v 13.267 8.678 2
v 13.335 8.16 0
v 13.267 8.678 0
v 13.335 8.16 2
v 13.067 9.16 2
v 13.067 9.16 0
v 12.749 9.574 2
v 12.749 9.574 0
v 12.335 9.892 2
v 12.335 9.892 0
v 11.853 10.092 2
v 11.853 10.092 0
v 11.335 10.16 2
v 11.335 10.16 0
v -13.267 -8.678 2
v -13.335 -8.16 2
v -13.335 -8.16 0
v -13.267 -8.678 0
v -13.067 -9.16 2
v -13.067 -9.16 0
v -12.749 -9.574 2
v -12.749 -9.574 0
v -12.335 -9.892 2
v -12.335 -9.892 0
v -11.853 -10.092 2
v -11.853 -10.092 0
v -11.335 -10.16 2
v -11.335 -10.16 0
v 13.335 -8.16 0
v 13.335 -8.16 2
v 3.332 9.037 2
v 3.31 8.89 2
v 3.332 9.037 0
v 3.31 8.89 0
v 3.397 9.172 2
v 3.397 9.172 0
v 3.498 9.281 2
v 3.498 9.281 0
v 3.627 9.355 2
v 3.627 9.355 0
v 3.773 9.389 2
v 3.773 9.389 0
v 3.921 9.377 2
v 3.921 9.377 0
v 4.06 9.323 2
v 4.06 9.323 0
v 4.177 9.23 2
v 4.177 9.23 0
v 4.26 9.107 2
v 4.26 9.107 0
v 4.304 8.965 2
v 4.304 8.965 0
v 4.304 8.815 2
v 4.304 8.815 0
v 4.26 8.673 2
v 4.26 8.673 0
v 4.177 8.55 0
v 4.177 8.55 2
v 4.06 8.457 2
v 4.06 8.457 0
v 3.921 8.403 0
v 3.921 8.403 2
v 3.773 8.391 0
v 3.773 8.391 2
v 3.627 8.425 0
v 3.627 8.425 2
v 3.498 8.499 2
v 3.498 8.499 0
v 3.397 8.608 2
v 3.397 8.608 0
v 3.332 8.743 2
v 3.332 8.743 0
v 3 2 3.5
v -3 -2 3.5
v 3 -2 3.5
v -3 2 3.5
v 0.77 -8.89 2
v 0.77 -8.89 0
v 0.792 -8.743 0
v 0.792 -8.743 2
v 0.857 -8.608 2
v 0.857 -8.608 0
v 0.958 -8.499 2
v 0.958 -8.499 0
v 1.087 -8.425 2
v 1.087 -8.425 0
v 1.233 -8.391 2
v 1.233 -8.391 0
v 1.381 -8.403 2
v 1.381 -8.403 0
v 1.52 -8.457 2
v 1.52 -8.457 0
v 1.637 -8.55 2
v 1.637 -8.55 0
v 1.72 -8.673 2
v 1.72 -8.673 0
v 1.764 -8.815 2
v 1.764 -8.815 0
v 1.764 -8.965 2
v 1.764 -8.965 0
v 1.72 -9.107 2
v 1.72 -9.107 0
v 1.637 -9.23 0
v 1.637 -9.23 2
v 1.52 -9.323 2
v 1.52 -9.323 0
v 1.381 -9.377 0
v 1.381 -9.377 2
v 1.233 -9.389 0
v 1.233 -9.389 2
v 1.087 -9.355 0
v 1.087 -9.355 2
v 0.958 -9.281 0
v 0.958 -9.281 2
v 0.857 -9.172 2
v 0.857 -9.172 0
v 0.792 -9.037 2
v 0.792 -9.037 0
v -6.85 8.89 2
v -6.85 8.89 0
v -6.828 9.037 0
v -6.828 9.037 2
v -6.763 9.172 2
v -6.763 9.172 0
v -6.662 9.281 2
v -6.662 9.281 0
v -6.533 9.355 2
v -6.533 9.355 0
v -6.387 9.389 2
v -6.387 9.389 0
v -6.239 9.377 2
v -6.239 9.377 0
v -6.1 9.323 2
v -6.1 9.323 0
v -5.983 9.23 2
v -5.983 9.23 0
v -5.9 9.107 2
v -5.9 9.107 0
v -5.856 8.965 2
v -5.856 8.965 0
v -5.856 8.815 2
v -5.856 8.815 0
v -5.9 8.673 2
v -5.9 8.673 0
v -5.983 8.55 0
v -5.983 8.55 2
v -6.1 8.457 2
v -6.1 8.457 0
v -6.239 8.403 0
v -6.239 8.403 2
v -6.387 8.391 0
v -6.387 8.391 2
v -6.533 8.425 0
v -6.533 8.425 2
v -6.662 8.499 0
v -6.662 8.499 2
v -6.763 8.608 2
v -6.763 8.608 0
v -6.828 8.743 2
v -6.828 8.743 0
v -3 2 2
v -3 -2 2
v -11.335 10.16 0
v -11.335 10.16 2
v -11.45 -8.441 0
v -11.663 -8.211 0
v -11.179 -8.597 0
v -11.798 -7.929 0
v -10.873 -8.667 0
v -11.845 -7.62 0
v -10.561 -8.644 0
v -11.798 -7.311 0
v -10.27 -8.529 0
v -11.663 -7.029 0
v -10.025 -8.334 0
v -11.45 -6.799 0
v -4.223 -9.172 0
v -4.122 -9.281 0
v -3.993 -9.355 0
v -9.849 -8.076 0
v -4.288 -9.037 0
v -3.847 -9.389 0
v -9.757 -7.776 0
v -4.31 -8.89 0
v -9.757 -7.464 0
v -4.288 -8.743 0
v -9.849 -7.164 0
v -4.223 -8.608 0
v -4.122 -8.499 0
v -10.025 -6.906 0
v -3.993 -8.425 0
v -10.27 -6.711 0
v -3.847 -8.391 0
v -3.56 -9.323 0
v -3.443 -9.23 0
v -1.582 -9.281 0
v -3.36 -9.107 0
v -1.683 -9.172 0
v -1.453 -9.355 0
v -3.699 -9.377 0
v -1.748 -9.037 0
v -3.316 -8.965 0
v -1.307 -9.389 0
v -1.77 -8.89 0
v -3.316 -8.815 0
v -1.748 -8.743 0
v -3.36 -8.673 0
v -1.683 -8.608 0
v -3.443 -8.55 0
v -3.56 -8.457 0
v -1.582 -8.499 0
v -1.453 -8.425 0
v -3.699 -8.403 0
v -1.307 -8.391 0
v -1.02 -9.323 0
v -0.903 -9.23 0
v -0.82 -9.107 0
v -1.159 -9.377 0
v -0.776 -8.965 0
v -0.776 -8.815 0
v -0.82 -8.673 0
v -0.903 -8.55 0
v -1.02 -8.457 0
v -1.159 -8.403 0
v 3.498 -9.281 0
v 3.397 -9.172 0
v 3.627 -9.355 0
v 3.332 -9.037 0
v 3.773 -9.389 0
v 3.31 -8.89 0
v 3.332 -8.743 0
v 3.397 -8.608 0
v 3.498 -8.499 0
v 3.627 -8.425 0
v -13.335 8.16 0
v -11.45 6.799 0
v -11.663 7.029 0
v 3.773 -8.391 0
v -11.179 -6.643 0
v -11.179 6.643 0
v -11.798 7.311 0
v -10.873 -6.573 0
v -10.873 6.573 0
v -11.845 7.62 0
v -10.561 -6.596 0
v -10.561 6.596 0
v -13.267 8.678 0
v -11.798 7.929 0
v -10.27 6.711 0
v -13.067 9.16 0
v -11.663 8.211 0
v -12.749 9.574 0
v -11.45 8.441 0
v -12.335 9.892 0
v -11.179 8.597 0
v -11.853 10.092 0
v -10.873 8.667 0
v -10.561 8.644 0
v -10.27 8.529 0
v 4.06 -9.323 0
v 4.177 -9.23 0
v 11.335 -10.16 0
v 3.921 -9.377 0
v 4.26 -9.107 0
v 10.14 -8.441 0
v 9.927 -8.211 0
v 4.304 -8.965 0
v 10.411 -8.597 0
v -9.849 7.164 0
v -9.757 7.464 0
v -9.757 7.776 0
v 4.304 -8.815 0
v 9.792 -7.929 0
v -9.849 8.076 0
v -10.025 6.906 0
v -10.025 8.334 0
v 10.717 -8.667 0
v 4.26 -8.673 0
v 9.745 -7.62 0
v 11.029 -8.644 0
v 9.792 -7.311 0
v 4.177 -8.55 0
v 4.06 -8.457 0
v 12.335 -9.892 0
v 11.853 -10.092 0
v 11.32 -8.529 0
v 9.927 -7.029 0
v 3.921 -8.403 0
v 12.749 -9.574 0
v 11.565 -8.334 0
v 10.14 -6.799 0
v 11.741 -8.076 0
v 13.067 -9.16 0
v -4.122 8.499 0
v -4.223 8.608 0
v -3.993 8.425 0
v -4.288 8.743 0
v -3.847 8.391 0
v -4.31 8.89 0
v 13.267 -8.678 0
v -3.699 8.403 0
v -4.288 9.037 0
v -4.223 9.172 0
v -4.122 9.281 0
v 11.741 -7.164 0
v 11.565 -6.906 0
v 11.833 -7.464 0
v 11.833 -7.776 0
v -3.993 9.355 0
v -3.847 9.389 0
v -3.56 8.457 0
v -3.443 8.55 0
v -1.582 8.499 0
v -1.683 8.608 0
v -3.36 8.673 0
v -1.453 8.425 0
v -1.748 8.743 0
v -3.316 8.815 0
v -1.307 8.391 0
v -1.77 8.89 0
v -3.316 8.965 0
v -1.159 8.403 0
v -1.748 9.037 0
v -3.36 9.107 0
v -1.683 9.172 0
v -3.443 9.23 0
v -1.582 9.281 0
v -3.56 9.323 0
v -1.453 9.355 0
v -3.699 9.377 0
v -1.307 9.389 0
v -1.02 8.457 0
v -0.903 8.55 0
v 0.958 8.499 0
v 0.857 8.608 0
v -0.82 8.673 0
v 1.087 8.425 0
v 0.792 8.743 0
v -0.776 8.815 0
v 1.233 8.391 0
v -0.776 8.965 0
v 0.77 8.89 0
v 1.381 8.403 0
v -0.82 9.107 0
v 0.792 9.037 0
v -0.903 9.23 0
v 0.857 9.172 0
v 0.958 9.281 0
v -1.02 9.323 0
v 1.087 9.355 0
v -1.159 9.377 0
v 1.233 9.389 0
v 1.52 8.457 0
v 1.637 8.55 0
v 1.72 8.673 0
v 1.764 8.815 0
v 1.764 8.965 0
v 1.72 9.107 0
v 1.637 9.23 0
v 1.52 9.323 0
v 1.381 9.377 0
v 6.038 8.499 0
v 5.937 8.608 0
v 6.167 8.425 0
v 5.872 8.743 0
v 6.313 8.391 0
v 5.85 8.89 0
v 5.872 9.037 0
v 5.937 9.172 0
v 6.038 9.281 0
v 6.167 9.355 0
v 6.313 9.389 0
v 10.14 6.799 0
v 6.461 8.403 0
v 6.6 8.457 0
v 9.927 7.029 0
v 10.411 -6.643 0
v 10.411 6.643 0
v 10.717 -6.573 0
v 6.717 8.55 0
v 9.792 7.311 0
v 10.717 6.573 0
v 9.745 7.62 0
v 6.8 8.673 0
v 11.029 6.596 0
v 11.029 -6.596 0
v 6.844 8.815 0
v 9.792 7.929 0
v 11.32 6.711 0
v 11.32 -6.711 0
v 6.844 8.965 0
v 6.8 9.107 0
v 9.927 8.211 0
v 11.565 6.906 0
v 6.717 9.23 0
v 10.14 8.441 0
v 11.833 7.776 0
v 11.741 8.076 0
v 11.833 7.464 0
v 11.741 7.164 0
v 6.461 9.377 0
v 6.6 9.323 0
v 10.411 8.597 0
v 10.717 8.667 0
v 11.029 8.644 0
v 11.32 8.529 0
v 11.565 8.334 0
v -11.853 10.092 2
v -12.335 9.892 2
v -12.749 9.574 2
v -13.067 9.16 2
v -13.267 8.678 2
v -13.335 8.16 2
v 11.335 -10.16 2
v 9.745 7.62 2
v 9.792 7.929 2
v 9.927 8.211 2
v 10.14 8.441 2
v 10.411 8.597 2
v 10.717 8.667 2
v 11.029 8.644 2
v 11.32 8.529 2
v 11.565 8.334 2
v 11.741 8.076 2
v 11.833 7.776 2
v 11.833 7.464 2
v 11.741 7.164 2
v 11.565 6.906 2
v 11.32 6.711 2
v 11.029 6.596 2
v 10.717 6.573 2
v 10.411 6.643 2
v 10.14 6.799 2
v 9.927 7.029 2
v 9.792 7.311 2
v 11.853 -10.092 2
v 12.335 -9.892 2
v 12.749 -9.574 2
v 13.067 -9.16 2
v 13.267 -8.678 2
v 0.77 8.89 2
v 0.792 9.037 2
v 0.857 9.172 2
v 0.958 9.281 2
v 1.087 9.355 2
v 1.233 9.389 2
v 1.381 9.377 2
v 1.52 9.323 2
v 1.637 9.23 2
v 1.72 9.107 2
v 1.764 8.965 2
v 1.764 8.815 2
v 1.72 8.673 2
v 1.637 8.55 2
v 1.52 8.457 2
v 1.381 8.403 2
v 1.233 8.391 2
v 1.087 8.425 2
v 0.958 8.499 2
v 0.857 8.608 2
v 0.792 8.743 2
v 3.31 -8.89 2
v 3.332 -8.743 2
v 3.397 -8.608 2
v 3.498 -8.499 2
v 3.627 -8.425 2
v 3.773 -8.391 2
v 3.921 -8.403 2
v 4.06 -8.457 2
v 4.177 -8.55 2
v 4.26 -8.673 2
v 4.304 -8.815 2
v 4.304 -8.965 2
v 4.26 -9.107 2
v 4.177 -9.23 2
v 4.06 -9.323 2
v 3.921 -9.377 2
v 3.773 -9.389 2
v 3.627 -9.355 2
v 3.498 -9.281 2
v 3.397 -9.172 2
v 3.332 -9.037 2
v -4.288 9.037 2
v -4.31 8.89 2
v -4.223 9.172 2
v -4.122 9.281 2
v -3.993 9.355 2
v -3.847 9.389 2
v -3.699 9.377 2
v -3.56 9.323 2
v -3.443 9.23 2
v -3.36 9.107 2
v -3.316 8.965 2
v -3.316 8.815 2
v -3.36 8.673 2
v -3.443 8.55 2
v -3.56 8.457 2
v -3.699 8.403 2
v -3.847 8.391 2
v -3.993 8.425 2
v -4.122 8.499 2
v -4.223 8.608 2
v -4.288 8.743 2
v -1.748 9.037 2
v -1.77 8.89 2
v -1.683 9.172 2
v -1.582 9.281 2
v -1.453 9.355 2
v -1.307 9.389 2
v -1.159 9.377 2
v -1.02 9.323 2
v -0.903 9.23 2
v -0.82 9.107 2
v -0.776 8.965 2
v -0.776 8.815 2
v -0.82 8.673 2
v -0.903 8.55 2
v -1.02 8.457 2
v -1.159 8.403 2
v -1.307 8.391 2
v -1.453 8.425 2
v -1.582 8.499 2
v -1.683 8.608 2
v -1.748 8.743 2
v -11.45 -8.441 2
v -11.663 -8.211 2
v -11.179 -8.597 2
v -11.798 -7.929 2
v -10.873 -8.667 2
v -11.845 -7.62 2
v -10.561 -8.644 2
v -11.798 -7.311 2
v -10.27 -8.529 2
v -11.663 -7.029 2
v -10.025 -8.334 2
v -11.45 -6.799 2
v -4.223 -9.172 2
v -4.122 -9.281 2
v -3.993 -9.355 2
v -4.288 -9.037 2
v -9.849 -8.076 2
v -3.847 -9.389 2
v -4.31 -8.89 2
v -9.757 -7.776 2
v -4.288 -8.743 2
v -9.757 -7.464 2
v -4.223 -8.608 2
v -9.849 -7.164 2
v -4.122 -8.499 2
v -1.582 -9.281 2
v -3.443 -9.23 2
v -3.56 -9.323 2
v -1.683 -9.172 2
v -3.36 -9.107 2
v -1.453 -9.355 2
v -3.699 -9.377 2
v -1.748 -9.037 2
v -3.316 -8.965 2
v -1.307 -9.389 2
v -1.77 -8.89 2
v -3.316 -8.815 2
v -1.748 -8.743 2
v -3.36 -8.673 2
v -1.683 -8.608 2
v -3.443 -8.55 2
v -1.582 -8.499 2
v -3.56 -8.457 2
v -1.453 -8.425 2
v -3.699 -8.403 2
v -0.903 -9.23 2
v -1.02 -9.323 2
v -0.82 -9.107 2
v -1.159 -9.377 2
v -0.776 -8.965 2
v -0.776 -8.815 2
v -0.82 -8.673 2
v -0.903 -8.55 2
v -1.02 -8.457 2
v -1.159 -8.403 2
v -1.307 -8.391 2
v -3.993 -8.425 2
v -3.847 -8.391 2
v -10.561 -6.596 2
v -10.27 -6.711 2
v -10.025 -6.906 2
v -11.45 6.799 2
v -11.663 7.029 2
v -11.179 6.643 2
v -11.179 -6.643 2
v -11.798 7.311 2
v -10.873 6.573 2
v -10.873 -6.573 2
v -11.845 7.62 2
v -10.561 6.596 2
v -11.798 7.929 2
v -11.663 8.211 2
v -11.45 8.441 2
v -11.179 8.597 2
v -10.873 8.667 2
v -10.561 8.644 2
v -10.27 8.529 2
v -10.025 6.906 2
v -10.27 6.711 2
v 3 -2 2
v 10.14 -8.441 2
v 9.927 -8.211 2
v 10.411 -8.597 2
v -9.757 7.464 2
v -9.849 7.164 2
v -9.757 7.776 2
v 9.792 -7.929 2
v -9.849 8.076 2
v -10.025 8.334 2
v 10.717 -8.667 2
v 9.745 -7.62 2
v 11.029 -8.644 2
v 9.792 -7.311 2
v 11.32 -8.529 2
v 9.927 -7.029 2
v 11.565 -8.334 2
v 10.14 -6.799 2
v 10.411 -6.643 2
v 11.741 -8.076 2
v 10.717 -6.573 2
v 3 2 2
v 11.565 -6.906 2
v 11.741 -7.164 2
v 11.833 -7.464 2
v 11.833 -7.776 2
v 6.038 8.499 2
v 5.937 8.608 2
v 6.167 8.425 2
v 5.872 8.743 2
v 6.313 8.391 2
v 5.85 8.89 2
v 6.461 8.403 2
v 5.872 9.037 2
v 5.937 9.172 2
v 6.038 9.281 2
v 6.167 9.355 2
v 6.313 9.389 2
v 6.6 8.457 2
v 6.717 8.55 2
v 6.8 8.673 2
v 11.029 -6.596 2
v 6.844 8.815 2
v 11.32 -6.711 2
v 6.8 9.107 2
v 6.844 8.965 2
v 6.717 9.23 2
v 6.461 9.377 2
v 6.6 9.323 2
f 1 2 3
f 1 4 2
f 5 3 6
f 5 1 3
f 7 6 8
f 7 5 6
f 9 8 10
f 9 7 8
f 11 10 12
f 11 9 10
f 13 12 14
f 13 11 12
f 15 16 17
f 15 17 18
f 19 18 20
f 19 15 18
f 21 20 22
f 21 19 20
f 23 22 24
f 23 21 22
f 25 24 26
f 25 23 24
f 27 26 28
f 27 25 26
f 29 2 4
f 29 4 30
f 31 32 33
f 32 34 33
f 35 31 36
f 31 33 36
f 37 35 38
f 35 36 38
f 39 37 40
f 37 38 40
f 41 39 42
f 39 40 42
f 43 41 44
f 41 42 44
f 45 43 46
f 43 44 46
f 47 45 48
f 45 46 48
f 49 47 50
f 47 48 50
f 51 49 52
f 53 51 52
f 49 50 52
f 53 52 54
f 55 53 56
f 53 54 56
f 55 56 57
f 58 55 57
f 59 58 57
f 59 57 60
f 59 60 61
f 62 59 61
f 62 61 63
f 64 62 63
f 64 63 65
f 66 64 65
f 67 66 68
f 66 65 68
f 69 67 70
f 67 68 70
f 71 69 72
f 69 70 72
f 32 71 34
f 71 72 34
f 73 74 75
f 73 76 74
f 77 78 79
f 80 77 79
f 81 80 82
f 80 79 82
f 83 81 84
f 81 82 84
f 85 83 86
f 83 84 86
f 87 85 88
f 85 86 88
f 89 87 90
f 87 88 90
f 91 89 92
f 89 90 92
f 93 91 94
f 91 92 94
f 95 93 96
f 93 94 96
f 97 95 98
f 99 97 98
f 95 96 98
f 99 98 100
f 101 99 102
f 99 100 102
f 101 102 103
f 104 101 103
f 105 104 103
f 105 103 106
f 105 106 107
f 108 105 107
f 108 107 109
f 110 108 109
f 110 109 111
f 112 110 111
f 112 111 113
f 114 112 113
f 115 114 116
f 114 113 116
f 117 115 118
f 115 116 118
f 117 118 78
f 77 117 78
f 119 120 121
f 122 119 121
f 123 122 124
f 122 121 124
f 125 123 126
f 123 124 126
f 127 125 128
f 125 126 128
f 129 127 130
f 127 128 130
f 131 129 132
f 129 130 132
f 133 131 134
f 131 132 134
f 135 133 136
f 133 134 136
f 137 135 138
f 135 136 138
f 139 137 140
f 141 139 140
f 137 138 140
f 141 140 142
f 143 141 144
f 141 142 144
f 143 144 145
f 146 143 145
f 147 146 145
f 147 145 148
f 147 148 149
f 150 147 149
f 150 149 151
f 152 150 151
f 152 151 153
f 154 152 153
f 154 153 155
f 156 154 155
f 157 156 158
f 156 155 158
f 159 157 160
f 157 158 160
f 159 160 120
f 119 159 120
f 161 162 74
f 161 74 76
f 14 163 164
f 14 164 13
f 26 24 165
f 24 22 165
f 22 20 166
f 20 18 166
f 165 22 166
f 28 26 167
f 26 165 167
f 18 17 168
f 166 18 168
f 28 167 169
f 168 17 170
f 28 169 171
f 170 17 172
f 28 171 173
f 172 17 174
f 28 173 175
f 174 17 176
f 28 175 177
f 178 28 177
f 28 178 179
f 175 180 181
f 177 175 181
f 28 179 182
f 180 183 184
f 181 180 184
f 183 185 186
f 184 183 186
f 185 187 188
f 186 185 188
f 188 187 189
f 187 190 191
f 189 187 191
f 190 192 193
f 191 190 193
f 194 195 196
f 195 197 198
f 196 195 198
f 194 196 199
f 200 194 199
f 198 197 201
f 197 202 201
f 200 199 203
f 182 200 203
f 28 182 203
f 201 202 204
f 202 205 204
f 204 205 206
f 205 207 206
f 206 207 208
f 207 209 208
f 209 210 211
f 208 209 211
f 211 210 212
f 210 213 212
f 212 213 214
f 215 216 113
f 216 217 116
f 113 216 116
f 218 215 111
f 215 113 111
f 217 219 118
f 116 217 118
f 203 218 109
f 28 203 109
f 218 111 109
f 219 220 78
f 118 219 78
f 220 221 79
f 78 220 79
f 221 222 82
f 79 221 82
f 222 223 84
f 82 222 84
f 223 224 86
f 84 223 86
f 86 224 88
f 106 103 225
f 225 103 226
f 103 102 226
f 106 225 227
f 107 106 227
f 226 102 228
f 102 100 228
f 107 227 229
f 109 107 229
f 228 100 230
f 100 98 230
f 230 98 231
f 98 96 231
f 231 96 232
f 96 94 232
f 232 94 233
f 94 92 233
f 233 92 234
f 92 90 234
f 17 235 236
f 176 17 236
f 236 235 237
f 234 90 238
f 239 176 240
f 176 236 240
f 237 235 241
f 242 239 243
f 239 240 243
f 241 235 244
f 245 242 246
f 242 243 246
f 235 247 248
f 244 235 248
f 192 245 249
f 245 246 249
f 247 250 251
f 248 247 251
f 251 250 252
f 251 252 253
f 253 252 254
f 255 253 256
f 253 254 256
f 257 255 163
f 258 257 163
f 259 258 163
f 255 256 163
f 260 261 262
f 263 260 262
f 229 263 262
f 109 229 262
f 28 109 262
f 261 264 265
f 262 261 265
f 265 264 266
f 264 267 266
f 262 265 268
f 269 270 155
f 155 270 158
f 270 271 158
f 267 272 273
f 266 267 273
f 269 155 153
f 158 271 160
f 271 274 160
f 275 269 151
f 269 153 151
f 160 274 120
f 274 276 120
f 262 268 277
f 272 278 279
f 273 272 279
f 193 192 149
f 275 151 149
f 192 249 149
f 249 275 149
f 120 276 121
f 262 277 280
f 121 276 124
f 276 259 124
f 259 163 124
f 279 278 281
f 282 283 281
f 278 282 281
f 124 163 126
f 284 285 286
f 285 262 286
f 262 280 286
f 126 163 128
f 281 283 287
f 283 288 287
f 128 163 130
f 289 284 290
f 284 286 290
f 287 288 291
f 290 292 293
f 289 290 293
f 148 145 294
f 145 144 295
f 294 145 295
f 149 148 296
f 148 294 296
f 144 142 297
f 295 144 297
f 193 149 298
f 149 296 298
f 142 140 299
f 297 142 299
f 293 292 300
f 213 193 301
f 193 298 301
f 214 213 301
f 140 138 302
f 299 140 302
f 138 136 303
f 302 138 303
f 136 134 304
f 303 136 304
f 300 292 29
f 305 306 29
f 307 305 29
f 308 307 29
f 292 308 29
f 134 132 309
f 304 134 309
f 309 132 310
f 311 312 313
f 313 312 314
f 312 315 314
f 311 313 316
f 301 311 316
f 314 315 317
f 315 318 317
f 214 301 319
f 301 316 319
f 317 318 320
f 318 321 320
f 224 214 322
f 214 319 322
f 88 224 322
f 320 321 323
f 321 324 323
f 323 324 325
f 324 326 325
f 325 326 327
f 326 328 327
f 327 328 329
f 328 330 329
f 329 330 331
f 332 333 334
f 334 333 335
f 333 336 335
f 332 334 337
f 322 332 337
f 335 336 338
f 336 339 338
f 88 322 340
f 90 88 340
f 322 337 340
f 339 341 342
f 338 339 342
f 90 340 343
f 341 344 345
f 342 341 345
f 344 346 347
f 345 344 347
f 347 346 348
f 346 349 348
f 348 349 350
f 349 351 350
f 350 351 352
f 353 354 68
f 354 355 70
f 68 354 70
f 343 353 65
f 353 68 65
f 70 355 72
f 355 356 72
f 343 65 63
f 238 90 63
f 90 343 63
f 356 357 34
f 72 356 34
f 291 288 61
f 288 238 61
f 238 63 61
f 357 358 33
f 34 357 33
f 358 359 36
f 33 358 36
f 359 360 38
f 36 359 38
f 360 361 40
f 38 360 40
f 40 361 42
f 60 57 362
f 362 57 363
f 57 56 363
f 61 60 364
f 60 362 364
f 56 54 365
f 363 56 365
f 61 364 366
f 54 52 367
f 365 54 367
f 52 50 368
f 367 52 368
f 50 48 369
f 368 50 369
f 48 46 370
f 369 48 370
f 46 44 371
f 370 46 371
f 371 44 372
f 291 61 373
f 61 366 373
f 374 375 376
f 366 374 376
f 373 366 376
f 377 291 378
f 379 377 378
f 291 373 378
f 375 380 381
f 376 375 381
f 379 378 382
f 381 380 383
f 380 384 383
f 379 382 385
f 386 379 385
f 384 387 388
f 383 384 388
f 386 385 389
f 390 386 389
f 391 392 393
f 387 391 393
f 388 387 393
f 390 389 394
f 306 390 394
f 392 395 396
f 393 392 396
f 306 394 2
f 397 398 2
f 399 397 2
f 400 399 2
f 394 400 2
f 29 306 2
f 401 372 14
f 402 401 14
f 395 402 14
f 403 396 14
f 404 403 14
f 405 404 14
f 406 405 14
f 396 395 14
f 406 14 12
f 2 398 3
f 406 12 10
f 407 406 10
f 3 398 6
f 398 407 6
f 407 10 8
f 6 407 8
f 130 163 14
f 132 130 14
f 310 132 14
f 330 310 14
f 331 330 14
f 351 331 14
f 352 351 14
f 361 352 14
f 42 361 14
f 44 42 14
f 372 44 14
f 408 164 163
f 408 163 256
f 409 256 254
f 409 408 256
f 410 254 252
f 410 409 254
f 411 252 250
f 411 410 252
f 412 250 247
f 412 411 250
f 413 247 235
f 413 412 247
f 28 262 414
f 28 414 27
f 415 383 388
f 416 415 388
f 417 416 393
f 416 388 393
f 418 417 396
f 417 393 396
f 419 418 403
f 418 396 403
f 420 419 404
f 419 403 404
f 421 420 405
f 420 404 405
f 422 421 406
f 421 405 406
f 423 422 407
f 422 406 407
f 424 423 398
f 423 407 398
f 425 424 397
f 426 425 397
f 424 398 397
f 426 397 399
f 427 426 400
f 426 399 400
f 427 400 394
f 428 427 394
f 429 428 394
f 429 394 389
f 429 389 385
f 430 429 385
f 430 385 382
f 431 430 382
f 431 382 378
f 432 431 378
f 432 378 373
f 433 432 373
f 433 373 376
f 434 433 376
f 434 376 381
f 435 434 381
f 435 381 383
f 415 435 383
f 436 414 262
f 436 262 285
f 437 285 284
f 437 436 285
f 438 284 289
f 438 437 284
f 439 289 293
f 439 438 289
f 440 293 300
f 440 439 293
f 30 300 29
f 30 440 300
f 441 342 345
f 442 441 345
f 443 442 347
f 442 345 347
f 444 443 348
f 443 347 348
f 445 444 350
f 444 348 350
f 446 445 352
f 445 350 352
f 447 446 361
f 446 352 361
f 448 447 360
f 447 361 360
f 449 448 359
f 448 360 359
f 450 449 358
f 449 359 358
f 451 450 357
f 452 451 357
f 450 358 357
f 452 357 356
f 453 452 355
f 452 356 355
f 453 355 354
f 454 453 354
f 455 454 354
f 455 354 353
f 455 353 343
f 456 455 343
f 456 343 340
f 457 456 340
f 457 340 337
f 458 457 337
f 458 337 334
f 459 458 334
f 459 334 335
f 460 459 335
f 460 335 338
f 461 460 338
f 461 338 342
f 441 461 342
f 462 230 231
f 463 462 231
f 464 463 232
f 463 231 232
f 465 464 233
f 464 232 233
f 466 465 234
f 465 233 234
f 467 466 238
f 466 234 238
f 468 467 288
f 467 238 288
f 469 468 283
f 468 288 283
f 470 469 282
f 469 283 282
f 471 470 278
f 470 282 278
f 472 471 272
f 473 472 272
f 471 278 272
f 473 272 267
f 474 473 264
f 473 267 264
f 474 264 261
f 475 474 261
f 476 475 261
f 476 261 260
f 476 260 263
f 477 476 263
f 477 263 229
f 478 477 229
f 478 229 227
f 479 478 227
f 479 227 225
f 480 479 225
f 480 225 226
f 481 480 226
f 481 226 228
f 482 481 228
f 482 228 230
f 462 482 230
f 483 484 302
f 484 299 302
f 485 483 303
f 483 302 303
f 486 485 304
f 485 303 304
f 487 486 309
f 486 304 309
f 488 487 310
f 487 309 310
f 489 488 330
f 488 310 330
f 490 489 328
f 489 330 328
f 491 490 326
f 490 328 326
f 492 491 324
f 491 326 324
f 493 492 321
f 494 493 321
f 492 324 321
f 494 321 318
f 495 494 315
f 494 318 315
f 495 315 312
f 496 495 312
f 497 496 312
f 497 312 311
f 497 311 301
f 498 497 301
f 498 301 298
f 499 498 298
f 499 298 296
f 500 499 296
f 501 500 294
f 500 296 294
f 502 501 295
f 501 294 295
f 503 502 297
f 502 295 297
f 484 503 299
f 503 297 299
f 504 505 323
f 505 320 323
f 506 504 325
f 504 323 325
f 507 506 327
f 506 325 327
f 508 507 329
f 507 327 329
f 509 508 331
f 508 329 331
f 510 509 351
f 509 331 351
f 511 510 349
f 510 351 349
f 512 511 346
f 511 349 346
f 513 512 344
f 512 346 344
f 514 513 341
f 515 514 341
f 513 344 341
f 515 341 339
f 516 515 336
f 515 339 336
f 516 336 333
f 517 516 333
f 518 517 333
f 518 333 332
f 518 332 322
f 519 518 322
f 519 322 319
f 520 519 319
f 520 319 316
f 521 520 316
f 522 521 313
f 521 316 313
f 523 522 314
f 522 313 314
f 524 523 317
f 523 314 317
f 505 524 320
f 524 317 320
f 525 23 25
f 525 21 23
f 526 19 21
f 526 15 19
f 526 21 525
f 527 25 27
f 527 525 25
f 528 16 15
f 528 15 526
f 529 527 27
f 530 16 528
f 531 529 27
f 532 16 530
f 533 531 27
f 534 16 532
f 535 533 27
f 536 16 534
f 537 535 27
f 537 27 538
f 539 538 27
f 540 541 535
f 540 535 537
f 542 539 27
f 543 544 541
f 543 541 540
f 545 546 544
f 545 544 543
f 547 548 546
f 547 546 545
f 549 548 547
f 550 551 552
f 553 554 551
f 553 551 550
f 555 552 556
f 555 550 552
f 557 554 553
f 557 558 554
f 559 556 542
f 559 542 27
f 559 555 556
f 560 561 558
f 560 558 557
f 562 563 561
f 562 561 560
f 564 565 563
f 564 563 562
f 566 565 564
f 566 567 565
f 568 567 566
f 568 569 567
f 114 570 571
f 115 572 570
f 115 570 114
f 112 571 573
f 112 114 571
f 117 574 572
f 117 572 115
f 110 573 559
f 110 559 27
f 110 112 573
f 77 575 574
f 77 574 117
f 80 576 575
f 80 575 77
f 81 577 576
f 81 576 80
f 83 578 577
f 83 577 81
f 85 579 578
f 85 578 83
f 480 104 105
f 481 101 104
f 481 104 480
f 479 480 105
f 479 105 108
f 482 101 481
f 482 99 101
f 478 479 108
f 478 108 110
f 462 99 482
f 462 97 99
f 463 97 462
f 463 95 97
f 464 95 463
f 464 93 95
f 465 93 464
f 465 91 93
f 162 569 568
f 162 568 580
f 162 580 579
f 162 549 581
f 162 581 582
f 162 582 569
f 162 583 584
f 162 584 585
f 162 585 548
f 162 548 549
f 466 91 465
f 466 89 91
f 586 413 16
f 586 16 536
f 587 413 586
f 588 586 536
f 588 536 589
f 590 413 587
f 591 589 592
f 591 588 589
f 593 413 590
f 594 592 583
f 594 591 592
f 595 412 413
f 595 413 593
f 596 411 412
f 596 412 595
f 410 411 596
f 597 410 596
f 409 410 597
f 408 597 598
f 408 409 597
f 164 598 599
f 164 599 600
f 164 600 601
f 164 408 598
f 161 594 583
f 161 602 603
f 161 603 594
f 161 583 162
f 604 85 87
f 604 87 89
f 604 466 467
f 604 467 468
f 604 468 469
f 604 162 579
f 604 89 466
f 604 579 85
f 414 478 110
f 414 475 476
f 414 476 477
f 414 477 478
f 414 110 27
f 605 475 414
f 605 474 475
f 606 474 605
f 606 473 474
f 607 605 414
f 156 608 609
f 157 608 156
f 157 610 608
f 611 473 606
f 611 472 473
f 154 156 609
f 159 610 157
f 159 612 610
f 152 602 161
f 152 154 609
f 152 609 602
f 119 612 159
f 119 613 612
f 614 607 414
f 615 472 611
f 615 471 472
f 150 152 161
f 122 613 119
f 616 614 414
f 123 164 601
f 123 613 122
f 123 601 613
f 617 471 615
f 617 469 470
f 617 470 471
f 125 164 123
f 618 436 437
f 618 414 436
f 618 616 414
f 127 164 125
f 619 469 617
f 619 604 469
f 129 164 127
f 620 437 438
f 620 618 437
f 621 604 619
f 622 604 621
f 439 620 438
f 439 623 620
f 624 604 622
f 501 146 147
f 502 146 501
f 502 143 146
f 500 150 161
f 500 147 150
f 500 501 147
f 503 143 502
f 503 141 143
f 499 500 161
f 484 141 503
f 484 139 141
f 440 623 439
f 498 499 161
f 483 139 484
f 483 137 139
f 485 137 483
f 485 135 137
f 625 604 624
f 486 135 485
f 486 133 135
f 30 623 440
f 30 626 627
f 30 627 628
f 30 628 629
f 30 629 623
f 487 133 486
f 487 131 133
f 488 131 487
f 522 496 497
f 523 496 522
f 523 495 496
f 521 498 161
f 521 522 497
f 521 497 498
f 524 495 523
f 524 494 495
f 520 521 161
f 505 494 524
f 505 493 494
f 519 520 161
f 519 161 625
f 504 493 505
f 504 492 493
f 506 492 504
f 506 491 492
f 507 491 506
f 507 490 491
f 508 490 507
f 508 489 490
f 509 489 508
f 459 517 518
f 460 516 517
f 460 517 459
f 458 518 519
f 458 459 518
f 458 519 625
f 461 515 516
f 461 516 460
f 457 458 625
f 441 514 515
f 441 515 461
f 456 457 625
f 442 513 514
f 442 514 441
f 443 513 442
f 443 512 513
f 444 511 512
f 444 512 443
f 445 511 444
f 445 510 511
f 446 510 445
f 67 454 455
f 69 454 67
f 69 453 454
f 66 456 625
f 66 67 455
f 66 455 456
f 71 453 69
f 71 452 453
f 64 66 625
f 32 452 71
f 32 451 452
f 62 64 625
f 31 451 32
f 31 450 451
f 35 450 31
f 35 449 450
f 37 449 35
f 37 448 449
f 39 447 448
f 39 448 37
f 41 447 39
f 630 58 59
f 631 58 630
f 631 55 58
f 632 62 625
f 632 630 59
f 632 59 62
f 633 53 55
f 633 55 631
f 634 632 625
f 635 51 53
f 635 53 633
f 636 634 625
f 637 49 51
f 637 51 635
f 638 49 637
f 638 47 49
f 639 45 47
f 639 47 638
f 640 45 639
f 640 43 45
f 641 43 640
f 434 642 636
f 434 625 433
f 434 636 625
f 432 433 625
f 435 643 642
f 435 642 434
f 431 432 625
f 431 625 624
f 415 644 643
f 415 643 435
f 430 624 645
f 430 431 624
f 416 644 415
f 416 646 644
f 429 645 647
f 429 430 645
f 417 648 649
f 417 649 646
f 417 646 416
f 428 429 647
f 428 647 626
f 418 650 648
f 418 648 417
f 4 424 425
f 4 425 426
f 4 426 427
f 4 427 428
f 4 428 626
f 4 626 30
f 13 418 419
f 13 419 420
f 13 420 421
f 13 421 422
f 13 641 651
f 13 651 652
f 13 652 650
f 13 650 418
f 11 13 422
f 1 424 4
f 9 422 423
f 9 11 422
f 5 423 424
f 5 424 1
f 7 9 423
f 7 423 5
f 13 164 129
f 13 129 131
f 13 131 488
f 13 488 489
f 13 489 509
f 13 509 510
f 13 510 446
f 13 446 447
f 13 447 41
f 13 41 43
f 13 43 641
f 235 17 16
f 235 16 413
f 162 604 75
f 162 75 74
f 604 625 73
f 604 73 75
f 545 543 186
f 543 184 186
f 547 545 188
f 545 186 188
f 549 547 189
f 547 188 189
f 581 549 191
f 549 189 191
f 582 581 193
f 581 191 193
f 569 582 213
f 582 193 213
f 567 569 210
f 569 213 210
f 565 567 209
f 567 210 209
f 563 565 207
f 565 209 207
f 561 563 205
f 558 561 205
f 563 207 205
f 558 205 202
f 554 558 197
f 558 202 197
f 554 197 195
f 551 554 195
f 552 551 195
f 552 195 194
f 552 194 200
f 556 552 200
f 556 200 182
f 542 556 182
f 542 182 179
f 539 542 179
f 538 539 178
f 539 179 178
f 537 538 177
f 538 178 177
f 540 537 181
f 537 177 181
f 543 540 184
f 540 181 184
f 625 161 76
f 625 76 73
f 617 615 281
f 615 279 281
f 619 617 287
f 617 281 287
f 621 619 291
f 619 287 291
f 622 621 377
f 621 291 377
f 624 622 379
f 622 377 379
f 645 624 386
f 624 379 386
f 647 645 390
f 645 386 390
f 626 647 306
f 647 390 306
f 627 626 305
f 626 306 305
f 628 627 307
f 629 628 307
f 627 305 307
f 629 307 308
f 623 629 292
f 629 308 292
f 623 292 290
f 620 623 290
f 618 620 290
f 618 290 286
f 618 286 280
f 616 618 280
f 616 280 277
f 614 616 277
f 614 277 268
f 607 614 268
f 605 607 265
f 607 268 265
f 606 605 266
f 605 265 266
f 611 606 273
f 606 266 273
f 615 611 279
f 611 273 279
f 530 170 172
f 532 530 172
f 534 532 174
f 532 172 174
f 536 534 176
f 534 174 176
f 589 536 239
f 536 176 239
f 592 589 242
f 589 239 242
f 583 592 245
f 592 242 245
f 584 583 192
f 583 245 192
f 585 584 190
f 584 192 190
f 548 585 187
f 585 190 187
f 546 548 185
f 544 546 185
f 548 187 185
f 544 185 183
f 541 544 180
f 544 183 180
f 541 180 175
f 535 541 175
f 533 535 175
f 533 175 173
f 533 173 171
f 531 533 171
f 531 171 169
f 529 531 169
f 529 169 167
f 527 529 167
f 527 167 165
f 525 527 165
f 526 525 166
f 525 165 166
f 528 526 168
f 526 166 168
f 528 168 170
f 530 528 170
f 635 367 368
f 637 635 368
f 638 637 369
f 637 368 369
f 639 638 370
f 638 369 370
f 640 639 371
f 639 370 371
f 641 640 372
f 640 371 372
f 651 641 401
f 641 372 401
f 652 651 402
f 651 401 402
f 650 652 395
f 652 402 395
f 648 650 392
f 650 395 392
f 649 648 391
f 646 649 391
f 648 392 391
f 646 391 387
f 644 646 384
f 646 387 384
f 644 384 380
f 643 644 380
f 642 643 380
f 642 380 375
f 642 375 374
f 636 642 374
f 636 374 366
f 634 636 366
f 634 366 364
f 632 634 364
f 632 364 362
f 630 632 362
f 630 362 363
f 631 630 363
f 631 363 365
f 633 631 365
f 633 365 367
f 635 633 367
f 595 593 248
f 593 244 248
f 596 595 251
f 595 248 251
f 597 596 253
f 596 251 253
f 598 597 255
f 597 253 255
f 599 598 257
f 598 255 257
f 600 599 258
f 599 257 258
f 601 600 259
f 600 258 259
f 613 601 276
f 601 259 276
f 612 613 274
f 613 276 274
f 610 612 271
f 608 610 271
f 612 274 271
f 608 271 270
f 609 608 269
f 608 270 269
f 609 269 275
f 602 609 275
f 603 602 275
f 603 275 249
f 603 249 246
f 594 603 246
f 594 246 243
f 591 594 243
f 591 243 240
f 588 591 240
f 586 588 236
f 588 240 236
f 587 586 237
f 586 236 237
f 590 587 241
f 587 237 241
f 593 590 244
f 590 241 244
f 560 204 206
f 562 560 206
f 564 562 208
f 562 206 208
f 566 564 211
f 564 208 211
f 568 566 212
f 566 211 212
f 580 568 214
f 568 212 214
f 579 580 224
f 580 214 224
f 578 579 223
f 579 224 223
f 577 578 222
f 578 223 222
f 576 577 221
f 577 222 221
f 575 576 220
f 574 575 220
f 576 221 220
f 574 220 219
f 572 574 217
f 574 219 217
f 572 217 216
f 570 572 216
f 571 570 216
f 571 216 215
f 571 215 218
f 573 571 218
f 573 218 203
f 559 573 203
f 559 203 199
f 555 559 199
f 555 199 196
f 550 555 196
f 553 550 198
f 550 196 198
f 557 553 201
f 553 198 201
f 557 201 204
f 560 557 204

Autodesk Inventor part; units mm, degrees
ref_plane "YZ Plane" through (0, 0, 0) normal (1, 0, 0) x (0, 1, 0)
ref_plane "XZ Plane" through (0, 0, 0) normal (0, 1, 0) x (-1, 0, 0)
ref_plane "XY Plane" through (0, 0, 0) normal (0, 0, 1) x (1, 0, 0)
sketch "Skizze1" plane through (0, 0, 0) normal (0, 0, 1) x (1, 0, 0)
  line L0 (-13.335, 10.16) -> (13.335, 10.16)
  line L1 (13.335, 10.16) -> (13.335, -10.16)
  line L2 (13.335, -10.16) -> (-13.335, -10.16)
  line L3 (-13.335, -10.16) -> (-13.335, 10.16)
  line L4 (-13.335, 10.16) -> (13.335, -10.16) construction
  line L5 (13.335, 10.16) -> (-13.335, -10.16) construction
  point P0 (0, 0)
  dimension "d0" = 26.67
  dimension "d1" = 20.32
extrude "Extrusion1" add sketch "Skizze1" along normal blind 2
fillet "Rundung1" radius 2 4 edges at (-13.335, -10.16, 1) (13.335, -10.16, 1) (13.335, 10.16, 1) (-13.335, 10.16, 1)
sketch "Skizze2" plane through (0, 0, 0) normal (0, 0, -1) x (-1, 0, 0)
  line L0 (-10.795, -7.62) -> (10.795, -7.62) construction
  line L1 (10.795, -7.62) -> (10.795, 7.62) construction
  line L2 (10.795, 7.62) -> (-10.795, 7.62) construction
  line L3 (-10.795, 7.62) -> (-10.795, -7.62) construction
  line L4 (-10.795, -7.62) -> (10.795, 7.62) construction
  line L5 (10.795, -7.62) -> (-10.795, 7.62) construction
  line L6 (-6.35, -8.89) -> (6.35, -8.89) construction
  line L7 (6.35, -8.89) -> (6.35, 8.89) construction
  line L8 (6.35, 8.89) -> (-6.35, 8.89) construction
  line L9 (-6.35, 8.89) -> (-6.35, -8.89) construction
  line L10 (-6.35, -8.89) -> (6.35, 8.89) construction
  line L11 (6.35, -8.89) -> (-6.35, 8.89) construction
  circle A0 centre (6.35, 8.89) radius 0.5
  circle A1 centre (3.81, 8.89) radius 0.5
  line L12 (3.81, 8.89) -> (-8.89, 8.89) construction
  circle A2 centre (1.27, 8.89) radius 0.5
  line L13 (1.27, 8.89) -> (-11.43, 8.89) construction
  circle A3 centre (-1.27, 8.89) radius 0.5
  line L14 (-1.27, 8.89) -> (-13.97, 8.89) construction
  circle A4 centre (-3.81, 8.89) radius 0.5
  line L15 (-3.81, 8.89) -> (-16.51, 8.89) construction
  circle A5 centre (-6.35, 8.89) radius 0.5
  line L16 (-6.35, 8.89) -> (-19.05, 8.89) construction
  circle A6 centre (3.81, -8.89) radius 0.5
  circle A7 centre (1.27, -8.89) radius 0.5
  line L17 (-8.89, -8.89) -> (3.81, -8.89) construction
  circle A8 centre (-1.27, -8.89) radius 0.5
  line L18 (-11.43, -8.89) -> (1.27, -8.89) construction
  circle A9 centre (-3.81, -8.89) radius 0.5
  line L19 (-13.97, -8.89) -> (-1.27, -8.89) construction
  circle A10 centre (10.795, -7.62) radius 1.05
  circle A11 centre (-10.795, -7.62) radius 1.05
  circle A12 centre (-10.795, 7.62) radius 1.05
  circle A13 centre (10.795, 7.62) radius 1.05
  point P0 (0, 0)
  dimension "d5" = 21.59
  dimension "d6" = 15.24
  dimension "d7" = 17.78
  dimension "d8" = 12.7
  dimension "d9" = 1
  dimension "d14" = 2.54
  dimension "d19" = 1
  dimension "d22" = 2.54
  dimension "d27" = 2.1
  dimension "d28" = 2.1
  dimension "d29" = 2.1
  dimension "d30" = 2.1
extrude "Extrusion2" cut sketch "Skizze2" against normal through all
sketch "Skizze3" plane through (0, 0, 2) normal (0, 0, 1) x (1, 0, 0)
  line L0 (-3, 2) -> (3, 2)
  line L1 (3, 2) -> (3, -2)
  line L2 (3, -2) -> (-3, -2)
  line L3 (-3, -2) -> (-3, 2)
  line L4 (-3, 2) -> (3, -2) construction
  line L5 (3, 2) -> (-3, -2) construction
  point P0 (0, 0)
  dimension "d33" = 6
  dimension "d34" = 4
extrude "Extrusion3" add sketch "Skizze3" along normal blind 1.5
properties part number "BNO055" material "Kupfer, Guss"
